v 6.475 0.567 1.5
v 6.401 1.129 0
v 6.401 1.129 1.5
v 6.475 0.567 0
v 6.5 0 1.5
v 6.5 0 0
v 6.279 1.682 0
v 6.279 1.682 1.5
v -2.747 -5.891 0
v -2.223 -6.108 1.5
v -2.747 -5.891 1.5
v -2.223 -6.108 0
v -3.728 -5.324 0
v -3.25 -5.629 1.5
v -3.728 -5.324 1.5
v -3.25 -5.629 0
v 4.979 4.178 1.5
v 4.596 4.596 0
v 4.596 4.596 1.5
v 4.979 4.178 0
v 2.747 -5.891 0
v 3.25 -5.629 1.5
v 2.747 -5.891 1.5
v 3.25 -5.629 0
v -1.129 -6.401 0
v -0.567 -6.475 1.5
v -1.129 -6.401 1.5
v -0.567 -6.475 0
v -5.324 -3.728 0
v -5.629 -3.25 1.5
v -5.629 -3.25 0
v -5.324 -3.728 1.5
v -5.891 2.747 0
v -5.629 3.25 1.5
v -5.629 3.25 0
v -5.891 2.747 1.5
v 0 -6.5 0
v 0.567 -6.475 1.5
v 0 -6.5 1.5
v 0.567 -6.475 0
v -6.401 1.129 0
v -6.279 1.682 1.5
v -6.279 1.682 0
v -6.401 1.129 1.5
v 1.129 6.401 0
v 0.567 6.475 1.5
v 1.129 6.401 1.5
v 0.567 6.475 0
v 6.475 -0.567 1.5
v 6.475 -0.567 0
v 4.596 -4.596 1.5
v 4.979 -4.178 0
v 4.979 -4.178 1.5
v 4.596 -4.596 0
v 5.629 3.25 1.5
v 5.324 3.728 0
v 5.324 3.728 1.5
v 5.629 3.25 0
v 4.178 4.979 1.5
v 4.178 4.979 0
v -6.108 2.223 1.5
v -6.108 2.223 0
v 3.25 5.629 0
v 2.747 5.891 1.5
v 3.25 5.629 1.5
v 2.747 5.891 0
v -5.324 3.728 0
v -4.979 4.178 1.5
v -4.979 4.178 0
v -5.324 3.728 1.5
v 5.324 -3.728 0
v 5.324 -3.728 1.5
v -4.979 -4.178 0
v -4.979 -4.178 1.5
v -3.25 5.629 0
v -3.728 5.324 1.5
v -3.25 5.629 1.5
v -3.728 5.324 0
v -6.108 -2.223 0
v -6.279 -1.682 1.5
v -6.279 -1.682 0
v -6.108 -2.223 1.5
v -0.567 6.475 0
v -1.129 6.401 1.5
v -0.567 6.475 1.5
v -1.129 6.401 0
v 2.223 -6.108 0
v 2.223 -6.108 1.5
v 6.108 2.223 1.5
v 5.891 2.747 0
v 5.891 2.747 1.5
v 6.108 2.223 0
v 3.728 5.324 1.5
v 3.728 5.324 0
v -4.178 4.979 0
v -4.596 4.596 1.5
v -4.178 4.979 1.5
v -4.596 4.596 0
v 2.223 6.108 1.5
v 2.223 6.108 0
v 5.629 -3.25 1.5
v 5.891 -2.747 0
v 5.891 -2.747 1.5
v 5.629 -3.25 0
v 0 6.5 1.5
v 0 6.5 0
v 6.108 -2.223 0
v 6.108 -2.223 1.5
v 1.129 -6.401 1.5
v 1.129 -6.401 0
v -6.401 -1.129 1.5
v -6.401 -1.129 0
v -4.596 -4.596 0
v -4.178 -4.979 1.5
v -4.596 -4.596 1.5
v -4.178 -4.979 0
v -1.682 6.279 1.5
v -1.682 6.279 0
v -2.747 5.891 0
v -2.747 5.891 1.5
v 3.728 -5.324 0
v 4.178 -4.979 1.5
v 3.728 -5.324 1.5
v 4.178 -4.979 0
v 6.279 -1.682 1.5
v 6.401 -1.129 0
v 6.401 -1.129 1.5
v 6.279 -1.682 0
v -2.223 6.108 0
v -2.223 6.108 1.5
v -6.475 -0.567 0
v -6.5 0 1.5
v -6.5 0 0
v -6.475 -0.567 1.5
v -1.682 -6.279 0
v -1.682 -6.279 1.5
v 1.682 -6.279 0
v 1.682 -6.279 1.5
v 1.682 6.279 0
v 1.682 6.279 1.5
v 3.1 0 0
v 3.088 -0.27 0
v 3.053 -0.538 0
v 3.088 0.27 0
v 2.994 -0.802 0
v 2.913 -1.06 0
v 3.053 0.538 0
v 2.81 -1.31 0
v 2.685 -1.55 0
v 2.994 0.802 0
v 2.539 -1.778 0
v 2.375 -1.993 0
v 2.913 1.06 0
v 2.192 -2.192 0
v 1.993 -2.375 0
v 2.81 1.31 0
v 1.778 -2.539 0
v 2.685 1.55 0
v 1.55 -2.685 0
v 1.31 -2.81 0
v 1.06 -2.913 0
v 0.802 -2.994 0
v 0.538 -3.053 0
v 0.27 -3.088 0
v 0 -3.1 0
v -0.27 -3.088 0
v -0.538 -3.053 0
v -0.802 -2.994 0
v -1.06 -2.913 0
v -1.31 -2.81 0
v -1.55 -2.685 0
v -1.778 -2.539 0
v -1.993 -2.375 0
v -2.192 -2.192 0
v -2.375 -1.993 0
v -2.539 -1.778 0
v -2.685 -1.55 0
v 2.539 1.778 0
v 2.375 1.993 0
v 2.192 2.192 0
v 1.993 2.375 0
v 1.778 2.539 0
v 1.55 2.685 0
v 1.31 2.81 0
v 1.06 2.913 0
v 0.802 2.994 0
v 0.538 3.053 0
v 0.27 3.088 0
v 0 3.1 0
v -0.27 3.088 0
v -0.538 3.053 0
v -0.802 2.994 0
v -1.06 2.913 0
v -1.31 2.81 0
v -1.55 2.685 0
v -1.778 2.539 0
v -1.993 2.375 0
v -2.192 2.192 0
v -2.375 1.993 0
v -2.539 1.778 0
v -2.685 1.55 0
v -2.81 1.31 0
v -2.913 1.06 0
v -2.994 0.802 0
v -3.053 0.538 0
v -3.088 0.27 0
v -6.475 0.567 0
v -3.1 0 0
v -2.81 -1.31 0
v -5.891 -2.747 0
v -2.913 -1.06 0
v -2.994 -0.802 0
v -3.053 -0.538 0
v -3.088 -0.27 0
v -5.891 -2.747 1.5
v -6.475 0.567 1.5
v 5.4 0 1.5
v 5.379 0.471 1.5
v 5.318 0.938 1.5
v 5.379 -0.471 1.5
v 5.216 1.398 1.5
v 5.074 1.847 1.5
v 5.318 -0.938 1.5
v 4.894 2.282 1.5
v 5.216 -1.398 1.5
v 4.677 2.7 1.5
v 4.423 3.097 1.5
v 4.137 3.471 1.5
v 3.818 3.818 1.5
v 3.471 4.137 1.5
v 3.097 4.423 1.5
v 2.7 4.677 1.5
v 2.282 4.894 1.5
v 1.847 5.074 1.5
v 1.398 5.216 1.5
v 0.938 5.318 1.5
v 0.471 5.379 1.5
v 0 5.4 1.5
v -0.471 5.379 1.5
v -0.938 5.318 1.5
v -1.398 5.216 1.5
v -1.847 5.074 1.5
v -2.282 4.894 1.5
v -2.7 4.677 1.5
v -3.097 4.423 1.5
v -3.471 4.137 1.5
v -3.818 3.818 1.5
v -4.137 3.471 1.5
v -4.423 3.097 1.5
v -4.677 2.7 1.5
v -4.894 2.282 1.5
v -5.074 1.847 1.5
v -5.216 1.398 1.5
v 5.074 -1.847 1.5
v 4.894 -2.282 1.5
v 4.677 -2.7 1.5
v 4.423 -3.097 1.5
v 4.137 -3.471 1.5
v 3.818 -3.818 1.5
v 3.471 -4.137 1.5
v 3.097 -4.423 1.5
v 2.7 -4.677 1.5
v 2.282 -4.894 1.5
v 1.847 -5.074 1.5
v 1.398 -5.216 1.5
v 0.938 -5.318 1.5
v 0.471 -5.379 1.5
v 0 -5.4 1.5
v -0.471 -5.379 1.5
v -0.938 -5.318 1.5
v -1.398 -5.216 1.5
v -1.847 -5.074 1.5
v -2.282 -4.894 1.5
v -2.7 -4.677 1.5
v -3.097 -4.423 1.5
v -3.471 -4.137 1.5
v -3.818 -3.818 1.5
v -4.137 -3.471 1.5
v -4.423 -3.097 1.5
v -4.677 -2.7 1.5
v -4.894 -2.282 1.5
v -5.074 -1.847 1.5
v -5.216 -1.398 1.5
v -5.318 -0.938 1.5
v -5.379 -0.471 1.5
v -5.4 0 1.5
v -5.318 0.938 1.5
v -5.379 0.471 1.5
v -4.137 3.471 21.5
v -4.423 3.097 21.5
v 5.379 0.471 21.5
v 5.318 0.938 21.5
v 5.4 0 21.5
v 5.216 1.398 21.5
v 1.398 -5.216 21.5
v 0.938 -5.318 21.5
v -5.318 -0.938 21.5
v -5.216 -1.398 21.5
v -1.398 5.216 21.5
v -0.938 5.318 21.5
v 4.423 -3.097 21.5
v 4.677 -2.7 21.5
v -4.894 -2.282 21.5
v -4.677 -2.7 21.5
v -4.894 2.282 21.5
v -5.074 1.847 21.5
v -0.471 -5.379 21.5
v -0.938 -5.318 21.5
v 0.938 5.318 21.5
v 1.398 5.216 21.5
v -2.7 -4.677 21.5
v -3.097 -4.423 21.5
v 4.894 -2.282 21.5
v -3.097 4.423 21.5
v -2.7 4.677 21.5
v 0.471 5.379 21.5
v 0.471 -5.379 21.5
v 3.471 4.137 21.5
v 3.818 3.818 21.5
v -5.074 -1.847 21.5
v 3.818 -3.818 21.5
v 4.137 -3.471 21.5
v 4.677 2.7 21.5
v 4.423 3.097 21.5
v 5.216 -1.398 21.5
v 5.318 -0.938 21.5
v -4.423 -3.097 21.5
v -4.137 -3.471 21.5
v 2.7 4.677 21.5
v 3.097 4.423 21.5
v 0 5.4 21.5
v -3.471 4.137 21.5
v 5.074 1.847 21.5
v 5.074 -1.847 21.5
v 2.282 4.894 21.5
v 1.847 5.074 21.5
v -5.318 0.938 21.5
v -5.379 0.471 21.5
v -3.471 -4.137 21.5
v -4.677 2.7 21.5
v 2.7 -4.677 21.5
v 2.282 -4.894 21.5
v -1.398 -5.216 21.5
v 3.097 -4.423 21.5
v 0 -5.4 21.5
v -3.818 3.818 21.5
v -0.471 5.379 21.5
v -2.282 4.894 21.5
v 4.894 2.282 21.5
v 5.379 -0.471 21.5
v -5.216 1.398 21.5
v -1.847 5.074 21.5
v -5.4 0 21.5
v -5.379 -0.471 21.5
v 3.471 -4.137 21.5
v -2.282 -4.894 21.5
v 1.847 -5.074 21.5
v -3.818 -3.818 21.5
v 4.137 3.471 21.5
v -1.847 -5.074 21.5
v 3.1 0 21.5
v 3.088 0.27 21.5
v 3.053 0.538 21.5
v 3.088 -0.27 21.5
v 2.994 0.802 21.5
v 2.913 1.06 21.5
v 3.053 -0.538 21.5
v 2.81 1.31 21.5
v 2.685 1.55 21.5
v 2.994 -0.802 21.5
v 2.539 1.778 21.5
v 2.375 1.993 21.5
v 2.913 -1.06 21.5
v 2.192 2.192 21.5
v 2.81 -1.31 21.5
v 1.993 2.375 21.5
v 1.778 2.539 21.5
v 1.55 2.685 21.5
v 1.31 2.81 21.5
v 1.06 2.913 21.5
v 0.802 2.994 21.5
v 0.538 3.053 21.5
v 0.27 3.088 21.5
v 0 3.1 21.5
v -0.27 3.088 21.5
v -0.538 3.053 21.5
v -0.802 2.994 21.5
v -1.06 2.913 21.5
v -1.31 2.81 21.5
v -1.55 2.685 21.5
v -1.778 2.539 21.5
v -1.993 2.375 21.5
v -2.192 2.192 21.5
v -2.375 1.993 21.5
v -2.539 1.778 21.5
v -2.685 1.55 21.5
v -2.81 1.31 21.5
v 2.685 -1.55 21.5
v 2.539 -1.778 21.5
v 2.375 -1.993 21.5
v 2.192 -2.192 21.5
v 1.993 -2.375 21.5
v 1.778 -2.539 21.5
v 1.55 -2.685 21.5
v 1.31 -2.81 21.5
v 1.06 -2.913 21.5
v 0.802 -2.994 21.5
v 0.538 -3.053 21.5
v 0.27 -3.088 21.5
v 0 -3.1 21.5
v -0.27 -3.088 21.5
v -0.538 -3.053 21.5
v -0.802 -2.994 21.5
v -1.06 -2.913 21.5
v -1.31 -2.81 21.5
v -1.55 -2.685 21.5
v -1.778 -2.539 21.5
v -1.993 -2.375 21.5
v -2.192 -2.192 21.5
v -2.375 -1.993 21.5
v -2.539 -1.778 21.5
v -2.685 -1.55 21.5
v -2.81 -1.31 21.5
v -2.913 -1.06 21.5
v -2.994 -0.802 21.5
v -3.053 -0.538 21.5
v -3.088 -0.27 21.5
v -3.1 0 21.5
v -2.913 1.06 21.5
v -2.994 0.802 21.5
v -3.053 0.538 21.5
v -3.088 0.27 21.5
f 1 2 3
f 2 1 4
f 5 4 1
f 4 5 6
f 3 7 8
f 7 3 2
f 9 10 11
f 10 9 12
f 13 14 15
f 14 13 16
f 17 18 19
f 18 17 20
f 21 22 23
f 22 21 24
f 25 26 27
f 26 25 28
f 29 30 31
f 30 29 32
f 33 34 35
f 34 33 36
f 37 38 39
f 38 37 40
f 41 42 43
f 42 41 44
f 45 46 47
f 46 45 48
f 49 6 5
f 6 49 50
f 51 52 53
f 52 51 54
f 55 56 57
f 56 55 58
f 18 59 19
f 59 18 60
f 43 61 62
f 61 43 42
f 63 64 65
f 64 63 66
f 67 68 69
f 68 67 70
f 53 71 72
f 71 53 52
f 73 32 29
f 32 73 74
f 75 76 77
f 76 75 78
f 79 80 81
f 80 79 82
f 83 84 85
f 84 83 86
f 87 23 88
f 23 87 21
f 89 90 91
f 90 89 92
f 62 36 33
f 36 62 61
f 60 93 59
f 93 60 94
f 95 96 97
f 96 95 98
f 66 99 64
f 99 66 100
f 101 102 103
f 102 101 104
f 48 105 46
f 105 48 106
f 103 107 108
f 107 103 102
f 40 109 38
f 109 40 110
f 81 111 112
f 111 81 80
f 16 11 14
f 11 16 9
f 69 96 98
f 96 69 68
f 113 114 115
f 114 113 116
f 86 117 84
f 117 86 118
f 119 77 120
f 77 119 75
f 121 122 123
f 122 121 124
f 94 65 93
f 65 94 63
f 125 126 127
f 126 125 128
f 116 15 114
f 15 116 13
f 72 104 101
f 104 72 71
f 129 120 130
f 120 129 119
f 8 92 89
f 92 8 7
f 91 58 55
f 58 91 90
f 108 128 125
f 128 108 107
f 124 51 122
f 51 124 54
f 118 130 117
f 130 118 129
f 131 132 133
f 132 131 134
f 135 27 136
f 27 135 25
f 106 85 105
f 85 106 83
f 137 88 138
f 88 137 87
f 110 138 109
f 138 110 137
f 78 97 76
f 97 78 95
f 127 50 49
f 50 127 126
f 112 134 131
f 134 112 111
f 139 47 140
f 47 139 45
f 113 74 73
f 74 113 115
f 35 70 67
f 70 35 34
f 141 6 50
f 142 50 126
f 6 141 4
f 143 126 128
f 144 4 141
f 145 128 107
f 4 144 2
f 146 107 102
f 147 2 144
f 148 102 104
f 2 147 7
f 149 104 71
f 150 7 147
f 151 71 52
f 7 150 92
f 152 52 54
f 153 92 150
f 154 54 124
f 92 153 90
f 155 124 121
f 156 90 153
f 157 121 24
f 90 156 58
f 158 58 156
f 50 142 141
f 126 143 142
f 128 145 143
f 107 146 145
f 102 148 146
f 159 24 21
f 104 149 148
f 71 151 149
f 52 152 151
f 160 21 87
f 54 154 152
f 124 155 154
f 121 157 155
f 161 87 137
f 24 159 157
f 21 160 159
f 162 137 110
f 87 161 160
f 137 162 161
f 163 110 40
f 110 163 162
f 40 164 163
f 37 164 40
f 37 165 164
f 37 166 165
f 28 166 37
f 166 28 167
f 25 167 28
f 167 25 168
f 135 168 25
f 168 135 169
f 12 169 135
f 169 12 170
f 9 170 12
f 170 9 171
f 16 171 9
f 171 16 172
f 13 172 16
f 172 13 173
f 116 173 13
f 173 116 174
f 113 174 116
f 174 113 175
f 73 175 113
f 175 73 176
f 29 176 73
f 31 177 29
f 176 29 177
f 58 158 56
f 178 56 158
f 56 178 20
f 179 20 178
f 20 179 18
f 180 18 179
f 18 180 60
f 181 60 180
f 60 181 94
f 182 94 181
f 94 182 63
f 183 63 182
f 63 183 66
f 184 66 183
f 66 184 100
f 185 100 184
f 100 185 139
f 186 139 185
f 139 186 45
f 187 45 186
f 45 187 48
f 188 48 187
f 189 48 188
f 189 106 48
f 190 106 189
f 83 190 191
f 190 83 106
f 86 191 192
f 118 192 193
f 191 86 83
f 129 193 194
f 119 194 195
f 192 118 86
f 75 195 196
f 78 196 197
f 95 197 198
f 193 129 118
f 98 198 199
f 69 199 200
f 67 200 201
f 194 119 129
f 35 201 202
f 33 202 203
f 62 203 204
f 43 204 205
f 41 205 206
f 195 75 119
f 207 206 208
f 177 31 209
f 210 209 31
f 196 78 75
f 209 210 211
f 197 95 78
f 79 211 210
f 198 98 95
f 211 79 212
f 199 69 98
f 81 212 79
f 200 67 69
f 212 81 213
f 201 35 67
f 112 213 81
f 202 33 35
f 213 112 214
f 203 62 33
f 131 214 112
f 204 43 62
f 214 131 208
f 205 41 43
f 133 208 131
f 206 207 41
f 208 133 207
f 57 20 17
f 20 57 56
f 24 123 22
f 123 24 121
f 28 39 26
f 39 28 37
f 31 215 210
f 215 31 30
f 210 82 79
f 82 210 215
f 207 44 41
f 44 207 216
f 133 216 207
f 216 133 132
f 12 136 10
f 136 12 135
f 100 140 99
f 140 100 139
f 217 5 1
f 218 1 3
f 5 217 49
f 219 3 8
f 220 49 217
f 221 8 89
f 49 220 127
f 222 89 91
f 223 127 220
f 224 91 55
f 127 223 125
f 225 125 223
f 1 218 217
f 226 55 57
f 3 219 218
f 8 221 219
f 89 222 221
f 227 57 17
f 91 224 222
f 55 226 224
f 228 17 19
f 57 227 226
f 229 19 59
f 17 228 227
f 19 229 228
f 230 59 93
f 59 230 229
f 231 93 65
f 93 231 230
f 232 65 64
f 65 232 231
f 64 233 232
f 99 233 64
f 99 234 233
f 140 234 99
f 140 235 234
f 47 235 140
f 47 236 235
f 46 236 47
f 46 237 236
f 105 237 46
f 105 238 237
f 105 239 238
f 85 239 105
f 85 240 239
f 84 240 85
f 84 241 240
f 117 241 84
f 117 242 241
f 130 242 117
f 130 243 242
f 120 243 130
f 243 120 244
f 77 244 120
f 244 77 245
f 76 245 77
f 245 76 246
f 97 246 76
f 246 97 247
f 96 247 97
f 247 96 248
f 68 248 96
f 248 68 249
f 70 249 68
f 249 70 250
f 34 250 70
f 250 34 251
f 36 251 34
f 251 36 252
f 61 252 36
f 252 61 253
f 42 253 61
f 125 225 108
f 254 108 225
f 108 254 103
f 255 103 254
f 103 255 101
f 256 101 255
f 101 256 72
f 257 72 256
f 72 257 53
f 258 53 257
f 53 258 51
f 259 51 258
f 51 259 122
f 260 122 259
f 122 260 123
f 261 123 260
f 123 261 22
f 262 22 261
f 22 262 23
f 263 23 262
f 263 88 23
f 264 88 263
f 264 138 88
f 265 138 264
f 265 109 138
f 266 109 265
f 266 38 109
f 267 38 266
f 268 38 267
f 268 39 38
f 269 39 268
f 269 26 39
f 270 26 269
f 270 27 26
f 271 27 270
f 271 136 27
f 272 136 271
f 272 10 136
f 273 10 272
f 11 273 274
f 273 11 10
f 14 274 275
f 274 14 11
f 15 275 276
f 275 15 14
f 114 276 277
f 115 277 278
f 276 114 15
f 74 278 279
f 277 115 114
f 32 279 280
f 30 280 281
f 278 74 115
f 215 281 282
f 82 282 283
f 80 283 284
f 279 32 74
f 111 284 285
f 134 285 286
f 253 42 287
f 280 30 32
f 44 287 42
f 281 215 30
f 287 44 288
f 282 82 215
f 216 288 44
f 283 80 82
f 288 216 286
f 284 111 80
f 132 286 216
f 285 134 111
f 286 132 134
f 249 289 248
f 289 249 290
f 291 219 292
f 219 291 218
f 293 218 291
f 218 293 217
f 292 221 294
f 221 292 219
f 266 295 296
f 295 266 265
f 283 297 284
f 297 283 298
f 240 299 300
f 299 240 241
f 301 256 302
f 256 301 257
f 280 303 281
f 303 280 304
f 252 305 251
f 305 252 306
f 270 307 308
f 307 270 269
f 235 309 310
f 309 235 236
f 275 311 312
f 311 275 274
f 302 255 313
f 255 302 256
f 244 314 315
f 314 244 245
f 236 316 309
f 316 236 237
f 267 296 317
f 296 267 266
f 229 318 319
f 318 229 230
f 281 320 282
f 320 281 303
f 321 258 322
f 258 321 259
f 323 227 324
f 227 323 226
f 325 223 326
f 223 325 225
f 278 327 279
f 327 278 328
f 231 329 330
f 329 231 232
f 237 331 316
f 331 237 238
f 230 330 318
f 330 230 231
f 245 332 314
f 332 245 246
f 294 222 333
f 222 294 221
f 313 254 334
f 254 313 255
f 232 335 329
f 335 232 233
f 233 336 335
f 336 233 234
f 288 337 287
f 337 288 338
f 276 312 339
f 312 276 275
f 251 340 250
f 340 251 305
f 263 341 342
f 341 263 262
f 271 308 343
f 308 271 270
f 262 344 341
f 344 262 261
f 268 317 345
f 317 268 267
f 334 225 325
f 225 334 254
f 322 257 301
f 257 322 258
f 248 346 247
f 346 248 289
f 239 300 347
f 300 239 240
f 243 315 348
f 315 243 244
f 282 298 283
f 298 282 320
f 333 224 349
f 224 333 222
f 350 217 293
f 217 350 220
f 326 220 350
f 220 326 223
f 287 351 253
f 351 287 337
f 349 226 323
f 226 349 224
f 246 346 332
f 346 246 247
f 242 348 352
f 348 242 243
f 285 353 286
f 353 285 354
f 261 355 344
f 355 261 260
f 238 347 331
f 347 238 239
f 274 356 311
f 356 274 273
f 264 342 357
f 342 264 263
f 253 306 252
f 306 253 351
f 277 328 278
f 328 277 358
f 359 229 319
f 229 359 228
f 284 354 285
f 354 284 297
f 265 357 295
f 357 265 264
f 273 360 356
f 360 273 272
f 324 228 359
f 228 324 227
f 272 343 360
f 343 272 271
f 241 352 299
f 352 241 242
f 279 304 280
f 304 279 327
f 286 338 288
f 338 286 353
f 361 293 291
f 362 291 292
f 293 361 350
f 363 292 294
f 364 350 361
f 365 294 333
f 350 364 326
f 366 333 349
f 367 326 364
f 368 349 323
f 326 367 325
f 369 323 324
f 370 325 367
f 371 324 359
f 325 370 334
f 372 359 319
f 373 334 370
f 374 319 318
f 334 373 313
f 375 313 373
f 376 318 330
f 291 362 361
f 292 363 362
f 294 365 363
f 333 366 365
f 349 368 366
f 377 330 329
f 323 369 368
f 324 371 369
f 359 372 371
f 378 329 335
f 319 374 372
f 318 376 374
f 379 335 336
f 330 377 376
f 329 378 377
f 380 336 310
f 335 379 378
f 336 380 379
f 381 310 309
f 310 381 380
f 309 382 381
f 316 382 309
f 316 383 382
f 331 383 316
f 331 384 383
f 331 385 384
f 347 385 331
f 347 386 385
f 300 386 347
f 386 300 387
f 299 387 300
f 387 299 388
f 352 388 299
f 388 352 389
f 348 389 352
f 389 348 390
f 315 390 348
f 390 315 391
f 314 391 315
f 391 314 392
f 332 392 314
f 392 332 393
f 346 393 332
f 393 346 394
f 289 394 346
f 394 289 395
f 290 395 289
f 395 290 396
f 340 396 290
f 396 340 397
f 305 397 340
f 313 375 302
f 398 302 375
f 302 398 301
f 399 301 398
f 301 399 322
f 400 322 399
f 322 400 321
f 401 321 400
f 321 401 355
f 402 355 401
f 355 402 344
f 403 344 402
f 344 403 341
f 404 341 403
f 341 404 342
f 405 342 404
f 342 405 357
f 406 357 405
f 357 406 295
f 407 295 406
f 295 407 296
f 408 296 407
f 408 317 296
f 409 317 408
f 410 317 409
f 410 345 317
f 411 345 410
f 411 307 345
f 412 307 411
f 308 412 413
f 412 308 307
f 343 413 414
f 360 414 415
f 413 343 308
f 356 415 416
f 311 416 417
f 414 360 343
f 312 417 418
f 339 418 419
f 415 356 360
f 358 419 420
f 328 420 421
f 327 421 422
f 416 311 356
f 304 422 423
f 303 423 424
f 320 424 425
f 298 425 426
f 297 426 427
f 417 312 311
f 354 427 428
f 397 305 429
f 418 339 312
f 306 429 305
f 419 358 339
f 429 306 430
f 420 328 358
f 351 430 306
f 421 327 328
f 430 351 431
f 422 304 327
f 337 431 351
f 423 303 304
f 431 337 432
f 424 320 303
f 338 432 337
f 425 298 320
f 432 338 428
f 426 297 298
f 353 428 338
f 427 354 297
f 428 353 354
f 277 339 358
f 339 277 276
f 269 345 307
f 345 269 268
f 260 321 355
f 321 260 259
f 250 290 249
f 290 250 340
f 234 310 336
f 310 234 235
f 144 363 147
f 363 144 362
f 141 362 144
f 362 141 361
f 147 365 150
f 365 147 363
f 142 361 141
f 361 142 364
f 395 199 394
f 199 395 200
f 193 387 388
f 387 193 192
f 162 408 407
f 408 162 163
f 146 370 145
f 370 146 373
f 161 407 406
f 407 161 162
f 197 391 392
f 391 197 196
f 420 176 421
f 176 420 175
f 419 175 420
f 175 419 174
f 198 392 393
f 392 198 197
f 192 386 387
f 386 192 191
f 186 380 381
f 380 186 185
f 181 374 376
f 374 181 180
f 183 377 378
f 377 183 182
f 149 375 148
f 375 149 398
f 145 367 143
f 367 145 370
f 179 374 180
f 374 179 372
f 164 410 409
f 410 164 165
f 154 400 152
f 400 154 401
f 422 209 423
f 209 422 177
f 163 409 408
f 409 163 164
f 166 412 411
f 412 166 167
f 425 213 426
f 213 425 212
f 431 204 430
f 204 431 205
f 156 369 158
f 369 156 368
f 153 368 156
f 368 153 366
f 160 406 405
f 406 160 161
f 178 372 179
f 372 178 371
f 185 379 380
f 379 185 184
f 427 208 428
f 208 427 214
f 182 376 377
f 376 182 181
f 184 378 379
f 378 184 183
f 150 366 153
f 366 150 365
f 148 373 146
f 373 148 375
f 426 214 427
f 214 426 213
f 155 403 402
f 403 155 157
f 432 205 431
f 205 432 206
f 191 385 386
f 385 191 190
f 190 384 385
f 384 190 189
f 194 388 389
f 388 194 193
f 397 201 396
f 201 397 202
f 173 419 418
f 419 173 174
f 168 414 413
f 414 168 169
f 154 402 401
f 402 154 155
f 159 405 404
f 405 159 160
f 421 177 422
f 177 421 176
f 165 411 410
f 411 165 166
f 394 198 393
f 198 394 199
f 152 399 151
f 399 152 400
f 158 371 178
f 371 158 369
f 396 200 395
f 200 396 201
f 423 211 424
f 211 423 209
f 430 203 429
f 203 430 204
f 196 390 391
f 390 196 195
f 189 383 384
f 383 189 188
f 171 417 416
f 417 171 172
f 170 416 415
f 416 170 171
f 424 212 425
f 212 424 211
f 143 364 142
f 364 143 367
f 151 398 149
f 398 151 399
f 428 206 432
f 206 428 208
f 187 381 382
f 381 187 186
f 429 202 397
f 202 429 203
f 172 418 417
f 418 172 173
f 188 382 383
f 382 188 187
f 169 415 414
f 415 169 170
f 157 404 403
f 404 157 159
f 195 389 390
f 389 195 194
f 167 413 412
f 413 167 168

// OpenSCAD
// Adapter sleeve - a collar with a sleeve body that lines a 1.5 mL tube rack hole to hold a
// 0.2 mL PCR tube, with a through bore. NOVEL general part (a generic tube adapter).
//

top_d     = 13;
body_d    = 10.8;
collar_h  = 1.5;
body_h    = 21.5;
bore_d    = 6.2;

$fn = 72;

difference() {
    union() {
        cylinder(h = collar_h, d = top_d);
        cylinder(h = body_h, d = body_d);
    }
    translate([0, 0, -0.01]) cylinder(h = collar_h + 0.01, d = bore_d);
    translate([0, 0, -0.01]) cylinder(h = body_h + 0.01, d = bore_d);
}
